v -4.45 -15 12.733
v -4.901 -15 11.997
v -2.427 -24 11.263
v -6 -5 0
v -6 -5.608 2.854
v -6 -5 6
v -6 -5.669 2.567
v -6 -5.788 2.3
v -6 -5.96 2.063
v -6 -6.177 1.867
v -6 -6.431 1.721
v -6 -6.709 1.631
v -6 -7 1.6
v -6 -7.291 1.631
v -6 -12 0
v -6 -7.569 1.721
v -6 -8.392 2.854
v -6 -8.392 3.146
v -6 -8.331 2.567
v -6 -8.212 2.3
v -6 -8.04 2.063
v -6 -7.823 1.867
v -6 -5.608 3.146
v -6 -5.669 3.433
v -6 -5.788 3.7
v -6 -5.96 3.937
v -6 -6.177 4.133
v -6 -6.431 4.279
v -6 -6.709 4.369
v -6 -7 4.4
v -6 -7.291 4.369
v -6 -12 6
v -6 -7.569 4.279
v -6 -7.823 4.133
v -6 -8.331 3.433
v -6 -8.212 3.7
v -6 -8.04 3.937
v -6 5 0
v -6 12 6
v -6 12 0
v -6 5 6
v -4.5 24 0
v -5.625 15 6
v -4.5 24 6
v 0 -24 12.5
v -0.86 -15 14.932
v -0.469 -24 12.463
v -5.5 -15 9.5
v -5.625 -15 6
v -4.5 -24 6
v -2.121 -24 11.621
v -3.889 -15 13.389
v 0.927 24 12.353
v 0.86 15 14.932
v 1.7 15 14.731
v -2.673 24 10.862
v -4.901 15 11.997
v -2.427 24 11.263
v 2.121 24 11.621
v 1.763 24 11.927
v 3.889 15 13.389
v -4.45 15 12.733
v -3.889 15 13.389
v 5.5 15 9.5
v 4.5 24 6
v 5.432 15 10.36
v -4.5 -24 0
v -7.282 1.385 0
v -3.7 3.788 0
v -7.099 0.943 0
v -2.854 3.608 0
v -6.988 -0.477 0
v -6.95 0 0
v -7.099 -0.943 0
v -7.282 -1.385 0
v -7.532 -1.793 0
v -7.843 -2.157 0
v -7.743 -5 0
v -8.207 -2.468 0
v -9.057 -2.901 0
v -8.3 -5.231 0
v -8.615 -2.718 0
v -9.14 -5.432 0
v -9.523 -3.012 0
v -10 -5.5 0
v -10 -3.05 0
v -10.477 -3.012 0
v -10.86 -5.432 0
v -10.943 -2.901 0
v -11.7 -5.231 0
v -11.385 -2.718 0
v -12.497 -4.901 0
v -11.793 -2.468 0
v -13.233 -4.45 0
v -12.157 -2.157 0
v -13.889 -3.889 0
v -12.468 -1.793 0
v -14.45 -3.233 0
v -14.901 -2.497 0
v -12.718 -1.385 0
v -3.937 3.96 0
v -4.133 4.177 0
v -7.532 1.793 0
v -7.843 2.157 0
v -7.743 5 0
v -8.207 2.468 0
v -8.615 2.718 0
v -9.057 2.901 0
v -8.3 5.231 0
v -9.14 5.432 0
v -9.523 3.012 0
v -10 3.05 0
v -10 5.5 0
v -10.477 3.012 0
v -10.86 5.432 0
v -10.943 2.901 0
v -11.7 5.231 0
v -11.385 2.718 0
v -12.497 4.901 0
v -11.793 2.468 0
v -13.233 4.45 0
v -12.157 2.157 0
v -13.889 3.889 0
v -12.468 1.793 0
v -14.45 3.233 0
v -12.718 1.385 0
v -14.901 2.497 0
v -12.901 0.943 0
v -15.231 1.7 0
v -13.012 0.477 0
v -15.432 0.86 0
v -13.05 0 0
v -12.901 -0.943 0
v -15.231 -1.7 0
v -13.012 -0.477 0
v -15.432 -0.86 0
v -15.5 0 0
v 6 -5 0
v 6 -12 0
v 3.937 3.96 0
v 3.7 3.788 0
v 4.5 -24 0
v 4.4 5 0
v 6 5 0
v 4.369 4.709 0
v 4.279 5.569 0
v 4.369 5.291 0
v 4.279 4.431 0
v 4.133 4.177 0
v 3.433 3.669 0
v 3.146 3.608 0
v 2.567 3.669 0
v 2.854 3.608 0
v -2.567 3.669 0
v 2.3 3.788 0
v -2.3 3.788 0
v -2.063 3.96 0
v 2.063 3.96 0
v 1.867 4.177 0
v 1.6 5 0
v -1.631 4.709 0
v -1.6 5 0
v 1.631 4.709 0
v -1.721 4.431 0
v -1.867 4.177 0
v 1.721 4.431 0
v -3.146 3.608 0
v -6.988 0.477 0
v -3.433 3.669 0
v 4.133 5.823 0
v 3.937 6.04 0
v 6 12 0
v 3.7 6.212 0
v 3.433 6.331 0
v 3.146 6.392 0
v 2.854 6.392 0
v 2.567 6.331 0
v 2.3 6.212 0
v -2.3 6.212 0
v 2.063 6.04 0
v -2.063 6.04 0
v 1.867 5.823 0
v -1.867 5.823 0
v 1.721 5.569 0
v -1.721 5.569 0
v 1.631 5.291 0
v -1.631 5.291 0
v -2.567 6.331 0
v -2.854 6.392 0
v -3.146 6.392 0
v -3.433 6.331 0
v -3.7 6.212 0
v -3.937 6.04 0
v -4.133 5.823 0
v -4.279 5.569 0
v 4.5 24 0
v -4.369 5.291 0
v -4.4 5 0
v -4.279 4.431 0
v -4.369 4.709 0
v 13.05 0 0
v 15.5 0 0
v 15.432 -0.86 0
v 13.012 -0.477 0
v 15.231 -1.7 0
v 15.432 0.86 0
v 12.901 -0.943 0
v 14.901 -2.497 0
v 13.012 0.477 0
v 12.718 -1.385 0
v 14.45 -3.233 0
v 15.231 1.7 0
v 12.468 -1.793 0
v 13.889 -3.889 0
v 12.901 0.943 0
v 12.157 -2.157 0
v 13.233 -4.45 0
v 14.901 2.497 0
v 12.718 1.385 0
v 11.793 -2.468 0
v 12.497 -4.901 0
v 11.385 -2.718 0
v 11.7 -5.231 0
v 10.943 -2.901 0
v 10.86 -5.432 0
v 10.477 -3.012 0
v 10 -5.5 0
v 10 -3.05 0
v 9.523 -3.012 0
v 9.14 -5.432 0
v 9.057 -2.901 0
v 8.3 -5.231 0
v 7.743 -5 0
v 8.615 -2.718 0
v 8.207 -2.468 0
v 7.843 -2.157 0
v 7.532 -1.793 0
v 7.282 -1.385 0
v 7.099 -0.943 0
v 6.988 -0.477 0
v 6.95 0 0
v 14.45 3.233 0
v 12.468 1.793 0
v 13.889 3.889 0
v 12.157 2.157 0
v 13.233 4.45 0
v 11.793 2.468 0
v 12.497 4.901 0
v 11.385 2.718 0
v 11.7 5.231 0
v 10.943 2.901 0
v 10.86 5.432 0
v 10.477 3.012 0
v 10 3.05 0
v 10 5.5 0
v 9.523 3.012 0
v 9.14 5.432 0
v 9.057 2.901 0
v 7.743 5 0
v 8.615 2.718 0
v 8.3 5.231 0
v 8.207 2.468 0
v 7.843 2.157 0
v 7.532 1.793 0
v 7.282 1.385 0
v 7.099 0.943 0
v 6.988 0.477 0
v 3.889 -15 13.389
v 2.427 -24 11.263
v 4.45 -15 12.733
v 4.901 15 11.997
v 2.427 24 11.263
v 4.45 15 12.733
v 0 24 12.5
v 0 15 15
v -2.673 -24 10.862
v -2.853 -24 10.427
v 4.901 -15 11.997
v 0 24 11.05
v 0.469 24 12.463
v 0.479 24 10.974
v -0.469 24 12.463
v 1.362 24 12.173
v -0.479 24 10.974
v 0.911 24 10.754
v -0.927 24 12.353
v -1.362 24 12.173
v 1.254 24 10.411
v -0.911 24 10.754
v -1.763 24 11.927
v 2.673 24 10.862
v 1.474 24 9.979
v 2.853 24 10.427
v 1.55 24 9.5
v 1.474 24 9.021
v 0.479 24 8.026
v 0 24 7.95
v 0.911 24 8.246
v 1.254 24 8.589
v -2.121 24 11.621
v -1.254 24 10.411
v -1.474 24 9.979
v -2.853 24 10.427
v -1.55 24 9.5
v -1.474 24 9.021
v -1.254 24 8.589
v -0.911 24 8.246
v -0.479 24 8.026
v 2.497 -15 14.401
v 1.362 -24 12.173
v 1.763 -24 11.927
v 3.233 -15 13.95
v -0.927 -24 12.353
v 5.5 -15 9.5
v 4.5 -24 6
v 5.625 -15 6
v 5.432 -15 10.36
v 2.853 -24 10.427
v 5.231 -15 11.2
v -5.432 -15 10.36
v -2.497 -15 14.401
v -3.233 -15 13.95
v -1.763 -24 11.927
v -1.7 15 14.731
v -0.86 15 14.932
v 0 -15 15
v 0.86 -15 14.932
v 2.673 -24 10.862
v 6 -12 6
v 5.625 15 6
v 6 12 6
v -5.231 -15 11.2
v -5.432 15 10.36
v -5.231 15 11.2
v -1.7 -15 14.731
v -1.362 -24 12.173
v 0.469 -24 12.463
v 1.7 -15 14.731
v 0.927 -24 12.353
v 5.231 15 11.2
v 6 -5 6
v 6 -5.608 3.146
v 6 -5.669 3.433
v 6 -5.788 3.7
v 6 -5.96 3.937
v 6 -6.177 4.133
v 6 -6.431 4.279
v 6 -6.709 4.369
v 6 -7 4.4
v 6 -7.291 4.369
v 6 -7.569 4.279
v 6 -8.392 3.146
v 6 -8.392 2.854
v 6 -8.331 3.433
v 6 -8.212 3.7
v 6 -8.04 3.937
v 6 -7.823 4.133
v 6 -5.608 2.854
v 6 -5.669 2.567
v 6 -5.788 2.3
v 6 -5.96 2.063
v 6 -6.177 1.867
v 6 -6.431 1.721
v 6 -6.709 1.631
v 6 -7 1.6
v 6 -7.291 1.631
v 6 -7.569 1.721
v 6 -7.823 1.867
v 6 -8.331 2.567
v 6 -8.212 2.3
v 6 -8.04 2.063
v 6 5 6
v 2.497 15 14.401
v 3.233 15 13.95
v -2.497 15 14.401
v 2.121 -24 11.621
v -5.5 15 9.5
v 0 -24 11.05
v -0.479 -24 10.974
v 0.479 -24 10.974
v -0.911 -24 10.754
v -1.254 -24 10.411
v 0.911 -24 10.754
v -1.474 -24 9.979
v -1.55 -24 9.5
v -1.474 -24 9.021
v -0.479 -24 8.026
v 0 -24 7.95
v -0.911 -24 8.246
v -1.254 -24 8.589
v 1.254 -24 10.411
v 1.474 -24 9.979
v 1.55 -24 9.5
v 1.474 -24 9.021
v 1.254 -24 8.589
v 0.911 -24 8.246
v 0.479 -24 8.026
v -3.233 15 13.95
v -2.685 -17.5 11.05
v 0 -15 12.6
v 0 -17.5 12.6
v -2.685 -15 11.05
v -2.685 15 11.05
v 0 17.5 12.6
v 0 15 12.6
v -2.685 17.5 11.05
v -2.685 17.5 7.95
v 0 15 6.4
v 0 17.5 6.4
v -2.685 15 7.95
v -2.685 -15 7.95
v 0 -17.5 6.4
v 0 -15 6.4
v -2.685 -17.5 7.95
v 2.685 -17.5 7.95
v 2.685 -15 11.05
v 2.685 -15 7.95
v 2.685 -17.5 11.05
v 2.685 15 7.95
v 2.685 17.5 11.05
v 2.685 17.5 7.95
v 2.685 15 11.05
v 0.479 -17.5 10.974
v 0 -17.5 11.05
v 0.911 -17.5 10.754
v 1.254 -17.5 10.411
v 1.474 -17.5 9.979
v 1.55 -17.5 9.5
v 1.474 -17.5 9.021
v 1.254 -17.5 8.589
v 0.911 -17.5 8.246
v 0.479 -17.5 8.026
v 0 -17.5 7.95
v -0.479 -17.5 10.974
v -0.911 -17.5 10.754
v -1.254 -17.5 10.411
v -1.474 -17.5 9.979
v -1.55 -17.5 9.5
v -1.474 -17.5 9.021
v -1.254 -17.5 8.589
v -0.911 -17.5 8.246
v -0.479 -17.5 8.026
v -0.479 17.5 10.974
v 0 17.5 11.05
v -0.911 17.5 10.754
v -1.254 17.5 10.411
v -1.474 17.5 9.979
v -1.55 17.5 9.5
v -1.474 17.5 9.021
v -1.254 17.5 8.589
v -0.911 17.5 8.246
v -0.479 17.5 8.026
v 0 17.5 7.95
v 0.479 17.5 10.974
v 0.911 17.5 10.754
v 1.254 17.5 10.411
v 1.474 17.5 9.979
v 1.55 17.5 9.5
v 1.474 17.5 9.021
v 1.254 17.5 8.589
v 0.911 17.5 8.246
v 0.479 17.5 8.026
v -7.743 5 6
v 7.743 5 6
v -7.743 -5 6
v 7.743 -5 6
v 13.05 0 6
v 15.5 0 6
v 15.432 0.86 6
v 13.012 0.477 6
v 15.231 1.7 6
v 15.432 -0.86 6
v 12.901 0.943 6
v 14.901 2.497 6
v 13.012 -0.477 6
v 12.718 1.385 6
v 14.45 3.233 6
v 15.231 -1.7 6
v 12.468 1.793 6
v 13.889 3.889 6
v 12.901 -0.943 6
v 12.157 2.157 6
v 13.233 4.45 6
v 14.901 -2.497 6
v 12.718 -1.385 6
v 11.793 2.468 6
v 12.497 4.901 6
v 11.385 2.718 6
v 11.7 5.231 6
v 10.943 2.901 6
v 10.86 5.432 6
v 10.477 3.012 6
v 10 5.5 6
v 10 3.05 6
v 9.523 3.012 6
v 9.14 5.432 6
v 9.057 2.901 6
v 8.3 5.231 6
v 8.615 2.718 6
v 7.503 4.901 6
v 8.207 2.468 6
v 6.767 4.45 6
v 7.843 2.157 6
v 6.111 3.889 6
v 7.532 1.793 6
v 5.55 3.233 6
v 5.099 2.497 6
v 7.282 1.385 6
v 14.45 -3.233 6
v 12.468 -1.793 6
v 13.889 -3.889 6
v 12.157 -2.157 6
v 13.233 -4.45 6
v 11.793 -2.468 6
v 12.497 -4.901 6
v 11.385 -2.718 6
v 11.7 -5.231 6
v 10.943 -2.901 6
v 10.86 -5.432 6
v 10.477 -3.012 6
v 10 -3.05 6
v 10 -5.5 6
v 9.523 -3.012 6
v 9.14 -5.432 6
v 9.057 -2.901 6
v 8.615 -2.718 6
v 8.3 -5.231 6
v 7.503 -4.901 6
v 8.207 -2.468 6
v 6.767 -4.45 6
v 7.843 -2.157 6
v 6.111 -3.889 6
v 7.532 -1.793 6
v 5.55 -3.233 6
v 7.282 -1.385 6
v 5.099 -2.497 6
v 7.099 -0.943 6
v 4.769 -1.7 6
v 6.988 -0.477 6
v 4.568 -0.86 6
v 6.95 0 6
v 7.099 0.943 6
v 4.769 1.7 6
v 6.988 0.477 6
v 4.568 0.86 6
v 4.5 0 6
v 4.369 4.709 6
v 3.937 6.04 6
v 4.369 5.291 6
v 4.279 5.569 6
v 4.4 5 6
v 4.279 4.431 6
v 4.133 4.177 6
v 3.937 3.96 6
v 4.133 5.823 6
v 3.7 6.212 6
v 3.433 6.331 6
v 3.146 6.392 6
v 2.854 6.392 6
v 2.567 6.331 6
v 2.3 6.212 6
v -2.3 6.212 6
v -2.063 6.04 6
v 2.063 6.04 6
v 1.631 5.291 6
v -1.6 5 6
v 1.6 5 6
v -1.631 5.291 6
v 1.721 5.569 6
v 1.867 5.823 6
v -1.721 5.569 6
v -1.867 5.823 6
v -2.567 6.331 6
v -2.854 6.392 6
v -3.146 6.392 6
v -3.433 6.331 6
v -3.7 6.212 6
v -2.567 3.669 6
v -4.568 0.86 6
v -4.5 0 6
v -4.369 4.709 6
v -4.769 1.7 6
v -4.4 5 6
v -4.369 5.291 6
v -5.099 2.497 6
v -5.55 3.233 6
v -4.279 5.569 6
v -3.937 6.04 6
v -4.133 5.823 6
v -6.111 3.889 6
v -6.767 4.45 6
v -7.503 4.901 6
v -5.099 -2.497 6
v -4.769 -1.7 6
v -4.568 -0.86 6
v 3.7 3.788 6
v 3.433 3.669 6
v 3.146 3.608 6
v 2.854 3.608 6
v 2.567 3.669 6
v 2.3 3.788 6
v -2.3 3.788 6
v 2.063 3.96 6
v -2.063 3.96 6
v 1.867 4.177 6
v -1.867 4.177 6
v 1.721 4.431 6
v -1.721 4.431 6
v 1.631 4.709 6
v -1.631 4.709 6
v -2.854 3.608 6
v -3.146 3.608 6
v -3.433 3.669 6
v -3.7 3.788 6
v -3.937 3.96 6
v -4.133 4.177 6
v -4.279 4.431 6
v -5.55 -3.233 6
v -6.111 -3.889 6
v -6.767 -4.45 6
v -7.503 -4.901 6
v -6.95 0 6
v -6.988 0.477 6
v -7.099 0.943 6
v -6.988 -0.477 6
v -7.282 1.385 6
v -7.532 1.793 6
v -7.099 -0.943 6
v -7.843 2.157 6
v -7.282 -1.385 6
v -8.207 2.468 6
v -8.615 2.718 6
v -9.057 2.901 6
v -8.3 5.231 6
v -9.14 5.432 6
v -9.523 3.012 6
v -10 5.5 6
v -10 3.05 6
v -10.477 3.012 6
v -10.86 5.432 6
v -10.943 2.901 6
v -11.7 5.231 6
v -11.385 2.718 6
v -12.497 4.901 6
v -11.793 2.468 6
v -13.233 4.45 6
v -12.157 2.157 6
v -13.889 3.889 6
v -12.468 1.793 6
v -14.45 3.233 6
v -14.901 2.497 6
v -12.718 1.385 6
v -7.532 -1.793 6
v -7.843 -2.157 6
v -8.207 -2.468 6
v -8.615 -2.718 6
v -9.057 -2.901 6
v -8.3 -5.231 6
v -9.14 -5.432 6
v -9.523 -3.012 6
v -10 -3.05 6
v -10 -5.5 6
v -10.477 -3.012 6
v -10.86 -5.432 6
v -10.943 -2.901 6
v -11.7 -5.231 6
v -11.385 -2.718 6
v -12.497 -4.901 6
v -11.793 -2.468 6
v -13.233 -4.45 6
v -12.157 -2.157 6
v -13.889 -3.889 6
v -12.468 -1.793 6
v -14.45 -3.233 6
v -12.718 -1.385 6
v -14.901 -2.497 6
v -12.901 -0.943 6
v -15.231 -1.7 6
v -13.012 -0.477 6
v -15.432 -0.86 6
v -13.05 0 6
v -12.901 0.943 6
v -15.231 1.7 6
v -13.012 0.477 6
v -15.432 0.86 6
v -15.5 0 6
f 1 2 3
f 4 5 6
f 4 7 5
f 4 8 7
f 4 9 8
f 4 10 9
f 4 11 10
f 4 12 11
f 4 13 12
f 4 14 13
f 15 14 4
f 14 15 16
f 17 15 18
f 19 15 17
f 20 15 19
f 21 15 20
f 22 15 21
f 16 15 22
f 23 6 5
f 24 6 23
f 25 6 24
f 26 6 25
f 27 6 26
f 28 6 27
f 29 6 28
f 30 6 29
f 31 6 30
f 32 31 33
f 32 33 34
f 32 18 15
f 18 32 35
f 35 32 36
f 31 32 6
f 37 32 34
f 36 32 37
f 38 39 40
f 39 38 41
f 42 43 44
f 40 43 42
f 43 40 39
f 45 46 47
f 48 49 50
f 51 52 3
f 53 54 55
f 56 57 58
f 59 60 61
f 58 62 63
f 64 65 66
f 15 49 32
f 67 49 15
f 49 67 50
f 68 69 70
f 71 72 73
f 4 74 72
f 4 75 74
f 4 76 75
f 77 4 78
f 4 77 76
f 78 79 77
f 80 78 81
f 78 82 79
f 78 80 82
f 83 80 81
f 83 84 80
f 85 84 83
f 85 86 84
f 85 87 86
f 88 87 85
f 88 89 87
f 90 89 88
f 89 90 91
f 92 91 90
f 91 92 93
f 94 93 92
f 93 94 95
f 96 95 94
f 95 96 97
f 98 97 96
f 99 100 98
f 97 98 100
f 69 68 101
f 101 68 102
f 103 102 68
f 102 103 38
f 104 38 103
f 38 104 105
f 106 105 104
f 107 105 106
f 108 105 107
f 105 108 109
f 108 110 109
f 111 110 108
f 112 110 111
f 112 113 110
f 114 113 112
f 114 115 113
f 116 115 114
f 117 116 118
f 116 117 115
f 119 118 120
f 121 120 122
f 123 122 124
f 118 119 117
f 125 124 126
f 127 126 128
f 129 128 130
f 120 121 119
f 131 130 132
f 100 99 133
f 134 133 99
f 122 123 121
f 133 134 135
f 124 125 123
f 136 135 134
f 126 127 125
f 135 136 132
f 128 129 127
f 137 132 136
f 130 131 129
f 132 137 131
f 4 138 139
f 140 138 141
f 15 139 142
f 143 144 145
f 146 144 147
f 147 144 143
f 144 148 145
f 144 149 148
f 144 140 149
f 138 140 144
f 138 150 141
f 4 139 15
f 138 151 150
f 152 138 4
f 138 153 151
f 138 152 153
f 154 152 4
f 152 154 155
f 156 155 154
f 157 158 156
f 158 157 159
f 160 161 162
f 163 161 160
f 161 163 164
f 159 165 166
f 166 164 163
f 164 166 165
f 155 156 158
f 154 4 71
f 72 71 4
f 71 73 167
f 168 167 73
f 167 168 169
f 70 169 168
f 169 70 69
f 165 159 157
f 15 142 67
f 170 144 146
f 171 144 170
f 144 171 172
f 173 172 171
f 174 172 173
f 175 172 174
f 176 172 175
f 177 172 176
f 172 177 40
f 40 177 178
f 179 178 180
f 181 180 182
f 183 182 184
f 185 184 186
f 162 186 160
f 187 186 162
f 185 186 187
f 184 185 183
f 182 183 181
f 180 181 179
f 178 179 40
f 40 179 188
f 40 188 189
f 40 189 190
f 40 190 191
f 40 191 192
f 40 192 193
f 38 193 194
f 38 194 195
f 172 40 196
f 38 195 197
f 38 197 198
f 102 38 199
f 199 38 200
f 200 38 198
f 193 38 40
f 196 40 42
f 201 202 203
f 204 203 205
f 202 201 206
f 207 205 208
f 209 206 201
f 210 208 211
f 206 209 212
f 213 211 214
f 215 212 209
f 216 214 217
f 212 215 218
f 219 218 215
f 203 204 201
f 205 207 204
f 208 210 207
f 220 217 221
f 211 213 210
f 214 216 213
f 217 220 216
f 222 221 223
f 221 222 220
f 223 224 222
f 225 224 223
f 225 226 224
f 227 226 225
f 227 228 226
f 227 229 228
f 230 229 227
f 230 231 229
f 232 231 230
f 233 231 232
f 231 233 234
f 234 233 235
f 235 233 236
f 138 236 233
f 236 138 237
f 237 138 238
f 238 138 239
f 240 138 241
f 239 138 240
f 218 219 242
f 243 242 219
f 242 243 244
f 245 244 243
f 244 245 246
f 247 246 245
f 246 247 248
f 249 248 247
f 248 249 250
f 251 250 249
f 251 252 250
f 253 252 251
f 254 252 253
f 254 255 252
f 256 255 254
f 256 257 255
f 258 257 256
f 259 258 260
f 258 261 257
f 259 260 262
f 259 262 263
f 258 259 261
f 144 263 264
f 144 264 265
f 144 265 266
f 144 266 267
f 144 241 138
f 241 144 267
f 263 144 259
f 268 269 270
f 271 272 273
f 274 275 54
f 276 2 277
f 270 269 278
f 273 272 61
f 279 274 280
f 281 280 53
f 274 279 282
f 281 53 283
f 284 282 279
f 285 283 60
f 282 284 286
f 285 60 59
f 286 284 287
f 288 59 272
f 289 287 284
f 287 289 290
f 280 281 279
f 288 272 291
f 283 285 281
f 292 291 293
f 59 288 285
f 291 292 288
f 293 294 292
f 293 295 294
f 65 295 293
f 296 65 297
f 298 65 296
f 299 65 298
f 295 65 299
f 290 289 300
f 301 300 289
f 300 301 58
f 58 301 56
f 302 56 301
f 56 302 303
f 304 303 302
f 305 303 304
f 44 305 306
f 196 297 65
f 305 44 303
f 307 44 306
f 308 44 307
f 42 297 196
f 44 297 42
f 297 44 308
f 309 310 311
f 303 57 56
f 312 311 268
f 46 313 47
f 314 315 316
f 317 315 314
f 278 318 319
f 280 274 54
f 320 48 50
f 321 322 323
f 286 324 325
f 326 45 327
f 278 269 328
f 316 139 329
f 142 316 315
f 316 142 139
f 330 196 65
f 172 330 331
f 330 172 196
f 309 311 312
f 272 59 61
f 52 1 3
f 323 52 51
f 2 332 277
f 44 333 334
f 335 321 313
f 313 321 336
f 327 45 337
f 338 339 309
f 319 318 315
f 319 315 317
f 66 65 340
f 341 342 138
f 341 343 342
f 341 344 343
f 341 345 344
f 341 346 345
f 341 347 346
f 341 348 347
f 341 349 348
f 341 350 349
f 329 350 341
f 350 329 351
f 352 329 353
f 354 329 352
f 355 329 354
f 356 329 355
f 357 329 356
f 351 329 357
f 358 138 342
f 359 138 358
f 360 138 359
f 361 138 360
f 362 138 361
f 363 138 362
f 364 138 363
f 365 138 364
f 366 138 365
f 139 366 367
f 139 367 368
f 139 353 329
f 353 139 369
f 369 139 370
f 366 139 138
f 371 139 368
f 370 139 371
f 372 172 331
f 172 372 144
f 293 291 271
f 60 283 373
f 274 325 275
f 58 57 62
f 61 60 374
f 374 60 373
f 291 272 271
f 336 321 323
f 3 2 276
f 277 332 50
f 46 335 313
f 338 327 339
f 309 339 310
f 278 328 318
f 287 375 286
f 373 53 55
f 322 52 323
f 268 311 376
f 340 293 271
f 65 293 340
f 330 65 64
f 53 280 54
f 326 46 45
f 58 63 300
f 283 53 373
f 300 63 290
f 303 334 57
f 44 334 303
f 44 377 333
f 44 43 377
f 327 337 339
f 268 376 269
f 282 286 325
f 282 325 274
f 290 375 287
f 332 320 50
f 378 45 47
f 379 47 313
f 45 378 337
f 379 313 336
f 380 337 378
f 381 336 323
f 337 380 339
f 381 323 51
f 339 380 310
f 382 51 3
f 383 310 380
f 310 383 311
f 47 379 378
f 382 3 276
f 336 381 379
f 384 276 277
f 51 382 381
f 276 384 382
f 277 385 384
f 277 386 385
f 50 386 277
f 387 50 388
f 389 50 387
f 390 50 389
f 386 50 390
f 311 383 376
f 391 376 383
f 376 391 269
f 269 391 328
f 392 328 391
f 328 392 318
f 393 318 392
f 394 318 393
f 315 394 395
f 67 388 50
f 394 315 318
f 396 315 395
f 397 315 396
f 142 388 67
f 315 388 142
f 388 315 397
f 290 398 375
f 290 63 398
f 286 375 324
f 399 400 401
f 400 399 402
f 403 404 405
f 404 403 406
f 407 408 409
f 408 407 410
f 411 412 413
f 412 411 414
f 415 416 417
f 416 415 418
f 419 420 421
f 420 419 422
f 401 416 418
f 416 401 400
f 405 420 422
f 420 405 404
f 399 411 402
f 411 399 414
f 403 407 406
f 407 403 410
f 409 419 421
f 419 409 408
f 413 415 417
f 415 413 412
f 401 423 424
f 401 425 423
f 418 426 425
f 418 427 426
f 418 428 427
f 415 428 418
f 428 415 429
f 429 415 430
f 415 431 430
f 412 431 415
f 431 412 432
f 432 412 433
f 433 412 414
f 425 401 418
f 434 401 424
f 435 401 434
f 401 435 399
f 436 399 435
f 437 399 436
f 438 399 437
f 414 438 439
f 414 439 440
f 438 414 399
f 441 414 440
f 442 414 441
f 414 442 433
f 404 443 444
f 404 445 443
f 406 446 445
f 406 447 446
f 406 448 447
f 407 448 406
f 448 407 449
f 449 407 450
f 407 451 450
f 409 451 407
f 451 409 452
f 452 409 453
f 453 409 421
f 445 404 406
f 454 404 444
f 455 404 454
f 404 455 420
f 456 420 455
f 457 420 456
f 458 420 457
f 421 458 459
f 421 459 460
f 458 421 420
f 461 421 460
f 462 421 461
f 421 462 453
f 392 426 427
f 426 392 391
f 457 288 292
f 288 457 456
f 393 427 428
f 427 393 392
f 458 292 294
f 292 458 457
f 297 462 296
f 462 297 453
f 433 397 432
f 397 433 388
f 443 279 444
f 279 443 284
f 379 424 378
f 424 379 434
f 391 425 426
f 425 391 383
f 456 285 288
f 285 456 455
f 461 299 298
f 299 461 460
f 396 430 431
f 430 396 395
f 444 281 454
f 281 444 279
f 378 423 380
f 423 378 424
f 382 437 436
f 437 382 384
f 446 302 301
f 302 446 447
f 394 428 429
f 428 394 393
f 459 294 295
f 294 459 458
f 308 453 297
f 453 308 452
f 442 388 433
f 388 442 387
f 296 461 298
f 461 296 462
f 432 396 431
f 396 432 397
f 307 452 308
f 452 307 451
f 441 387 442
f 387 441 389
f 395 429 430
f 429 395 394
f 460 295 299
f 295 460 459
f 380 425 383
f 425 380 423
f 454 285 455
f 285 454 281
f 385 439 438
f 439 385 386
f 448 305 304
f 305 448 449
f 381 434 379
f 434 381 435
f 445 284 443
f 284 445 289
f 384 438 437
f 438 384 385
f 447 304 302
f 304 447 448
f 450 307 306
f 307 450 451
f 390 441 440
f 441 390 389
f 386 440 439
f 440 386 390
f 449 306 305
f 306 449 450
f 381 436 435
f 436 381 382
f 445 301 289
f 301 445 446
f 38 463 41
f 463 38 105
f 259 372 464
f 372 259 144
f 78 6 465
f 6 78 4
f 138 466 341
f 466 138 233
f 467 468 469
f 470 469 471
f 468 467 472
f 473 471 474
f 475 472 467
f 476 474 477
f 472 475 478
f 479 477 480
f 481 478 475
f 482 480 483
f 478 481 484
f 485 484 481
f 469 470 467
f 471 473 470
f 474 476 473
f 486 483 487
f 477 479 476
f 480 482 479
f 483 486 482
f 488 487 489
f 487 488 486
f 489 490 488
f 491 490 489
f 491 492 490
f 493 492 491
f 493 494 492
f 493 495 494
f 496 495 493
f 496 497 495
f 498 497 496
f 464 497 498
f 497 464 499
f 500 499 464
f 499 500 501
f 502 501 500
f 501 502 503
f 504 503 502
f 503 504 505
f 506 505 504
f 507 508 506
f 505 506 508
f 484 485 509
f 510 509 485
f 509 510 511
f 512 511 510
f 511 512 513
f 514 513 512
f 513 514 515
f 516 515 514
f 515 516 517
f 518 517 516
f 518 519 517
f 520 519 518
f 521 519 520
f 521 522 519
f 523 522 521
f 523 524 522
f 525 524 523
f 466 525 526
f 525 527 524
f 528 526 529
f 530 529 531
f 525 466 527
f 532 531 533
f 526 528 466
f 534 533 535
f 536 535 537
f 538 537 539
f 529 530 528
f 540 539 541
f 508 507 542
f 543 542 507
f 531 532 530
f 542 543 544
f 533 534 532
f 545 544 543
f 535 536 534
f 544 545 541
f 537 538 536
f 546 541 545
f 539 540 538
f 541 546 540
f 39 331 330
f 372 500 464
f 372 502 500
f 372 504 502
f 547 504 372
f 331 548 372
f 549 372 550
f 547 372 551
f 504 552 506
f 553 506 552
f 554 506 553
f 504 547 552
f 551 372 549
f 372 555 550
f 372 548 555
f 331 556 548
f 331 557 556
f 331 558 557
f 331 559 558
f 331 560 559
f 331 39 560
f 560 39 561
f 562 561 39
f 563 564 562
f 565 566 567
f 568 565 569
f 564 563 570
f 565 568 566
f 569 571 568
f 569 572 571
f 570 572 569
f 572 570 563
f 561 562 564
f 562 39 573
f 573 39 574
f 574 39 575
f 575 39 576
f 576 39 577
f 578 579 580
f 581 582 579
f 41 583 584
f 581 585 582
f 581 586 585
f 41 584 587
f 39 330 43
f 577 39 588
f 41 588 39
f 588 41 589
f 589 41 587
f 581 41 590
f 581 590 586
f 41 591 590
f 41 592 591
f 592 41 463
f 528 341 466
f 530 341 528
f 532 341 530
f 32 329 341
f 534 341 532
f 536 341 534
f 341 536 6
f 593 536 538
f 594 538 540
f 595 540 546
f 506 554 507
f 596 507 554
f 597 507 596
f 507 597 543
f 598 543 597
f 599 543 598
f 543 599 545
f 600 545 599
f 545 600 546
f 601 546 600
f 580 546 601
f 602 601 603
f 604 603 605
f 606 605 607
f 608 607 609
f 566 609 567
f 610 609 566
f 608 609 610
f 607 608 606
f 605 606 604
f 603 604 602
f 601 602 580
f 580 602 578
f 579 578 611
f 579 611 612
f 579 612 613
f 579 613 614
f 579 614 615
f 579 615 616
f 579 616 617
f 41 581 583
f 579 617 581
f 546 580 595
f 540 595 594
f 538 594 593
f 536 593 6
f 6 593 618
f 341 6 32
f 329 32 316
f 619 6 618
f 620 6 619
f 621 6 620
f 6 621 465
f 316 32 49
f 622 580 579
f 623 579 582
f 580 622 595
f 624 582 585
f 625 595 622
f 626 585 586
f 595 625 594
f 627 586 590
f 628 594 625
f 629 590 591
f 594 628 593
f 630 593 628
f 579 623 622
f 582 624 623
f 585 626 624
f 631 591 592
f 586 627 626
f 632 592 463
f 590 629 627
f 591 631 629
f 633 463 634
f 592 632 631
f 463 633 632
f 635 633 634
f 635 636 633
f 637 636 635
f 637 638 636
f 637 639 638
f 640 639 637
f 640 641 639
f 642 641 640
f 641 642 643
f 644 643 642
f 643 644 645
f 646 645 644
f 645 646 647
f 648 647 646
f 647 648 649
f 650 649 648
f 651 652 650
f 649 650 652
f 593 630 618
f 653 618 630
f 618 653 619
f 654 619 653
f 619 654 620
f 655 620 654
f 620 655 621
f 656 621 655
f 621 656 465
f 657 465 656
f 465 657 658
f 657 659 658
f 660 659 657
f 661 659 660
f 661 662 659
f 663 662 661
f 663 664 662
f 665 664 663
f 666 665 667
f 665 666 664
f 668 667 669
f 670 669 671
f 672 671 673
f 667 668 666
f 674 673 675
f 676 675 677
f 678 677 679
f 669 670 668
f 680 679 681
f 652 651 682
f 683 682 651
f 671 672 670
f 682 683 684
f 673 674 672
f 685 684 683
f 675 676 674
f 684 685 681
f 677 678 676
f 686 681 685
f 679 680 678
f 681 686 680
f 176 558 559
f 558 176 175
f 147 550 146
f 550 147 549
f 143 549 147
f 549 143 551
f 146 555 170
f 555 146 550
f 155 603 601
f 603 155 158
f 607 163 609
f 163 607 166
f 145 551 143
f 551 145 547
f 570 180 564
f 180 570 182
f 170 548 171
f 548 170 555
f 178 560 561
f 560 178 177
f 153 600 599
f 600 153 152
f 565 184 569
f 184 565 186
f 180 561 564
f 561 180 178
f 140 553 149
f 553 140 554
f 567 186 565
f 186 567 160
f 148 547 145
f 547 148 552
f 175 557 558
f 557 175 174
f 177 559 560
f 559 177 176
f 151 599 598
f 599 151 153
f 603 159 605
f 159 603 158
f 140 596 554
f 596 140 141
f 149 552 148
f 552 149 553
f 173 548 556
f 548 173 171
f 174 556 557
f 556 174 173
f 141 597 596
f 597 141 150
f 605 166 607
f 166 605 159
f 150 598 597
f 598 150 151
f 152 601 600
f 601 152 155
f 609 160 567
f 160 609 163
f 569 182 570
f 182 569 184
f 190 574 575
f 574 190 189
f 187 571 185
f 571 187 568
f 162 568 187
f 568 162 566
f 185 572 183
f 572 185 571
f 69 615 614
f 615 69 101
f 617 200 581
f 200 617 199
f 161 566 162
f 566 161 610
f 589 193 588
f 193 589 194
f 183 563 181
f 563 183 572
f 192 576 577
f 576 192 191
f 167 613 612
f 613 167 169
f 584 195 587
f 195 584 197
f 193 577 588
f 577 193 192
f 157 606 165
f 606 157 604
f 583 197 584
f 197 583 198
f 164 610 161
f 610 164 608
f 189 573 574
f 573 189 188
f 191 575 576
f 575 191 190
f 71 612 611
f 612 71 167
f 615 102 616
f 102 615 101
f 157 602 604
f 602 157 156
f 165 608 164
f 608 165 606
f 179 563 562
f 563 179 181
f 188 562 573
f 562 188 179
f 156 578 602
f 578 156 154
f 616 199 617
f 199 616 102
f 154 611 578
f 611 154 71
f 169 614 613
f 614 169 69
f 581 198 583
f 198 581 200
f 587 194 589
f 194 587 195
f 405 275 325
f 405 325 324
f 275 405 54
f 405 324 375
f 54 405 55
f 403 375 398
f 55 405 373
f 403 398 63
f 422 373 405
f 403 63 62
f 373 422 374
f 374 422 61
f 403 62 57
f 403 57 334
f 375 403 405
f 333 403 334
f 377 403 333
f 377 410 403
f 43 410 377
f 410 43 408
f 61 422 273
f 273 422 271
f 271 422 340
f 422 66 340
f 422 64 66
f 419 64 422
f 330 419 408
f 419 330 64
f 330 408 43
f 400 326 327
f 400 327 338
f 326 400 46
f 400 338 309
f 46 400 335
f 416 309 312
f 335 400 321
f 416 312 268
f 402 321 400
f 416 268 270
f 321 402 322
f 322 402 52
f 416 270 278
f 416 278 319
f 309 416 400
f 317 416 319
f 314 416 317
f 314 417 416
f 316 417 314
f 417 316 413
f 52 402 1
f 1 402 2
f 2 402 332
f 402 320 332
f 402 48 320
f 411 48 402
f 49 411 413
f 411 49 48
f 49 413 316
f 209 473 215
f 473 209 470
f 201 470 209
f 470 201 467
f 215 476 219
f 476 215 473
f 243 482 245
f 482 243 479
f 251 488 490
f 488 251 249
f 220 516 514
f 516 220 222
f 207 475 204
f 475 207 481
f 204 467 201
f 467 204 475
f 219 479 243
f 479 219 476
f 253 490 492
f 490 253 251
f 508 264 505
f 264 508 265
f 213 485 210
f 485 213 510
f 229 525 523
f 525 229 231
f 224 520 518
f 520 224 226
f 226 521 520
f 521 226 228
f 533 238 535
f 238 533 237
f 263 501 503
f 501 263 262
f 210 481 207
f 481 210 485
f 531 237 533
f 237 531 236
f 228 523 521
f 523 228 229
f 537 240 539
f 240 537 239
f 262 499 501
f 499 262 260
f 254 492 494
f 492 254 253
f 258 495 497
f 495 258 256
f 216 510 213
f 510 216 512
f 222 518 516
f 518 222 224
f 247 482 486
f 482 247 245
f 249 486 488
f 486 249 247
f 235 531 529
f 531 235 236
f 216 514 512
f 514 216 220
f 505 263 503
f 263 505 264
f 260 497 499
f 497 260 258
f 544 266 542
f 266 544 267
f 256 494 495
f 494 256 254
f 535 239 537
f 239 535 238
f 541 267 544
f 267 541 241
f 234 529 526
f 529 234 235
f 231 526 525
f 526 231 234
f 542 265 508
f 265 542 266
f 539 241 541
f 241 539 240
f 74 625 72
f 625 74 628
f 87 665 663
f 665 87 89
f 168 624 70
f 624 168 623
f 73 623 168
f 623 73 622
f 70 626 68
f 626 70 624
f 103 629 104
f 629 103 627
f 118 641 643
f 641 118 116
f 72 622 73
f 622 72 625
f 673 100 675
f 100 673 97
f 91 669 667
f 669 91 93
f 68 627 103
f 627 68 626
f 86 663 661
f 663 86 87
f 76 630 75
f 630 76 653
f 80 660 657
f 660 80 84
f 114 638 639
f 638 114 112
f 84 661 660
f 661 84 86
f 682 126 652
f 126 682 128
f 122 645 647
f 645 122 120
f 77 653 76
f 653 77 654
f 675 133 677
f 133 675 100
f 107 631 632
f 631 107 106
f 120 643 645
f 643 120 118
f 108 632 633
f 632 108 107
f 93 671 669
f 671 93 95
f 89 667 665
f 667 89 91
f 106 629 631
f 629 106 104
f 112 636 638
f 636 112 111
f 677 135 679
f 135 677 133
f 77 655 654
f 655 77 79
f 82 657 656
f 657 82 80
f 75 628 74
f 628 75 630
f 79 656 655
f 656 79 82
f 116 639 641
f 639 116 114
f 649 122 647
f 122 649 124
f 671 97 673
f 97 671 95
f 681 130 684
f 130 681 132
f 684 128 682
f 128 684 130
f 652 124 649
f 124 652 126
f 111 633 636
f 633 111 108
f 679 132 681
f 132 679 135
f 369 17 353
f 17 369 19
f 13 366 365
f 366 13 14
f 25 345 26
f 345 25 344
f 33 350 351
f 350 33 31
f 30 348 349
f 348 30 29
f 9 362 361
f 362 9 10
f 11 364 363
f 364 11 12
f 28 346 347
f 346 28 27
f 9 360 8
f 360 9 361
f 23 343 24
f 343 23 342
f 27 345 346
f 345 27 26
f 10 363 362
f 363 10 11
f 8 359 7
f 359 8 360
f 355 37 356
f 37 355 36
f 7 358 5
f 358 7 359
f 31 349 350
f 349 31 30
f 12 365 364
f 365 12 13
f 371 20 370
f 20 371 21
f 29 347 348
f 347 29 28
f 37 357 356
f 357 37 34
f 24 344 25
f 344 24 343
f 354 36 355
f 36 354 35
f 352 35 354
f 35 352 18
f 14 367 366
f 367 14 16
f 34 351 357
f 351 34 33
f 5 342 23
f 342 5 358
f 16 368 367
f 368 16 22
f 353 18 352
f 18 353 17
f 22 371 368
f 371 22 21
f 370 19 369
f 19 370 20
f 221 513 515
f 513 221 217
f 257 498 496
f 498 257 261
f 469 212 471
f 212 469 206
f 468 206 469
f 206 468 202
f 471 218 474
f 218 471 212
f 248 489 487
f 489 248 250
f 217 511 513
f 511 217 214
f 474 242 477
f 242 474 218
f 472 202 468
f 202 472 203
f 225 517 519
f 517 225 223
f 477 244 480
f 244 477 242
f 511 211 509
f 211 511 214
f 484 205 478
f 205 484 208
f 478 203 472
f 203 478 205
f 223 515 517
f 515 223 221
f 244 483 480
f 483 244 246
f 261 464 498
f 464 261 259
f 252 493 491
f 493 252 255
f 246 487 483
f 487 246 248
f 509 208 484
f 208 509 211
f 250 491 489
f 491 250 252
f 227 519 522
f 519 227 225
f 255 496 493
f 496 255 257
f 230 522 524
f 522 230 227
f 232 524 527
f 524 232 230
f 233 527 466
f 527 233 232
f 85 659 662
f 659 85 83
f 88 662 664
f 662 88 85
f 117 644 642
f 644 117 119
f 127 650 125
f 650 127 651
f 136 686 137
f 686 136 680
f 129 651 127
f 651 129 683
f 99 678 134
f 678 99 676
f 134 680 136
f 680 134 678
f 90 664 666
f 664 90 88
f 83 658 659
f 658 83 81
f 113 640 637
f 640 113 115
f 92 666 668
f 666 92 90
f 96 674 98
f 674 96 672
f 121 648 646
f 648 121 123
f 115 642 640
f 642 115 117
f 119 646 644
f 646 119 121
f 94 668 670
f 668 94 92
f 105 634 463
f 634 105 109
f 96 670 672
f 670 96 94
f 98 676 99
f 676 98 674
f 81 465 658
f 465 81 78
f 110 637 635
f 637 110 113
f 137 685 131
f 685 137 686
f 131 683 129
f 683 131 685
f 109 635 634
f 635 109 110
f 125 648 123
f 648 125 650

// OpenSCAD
plate_height = 6;

module igus_slide(){
	color("Silver") difference(){
		union(){
			translate([-200,-13.5,-6]) cube([400,27,6]);
			translate([-200,-9.5,-9]) cube([400,19,3]);
			translate([-200,-11,-9]) cube([400,22,1.5]);
		}
		translate([-210,-8.5,-4]) cube([420,17,5]);
		translate([-210,-12,-4.5]) cube([420,24,3.5]);
	}
}

module igus_slider(){
	translate([0,0,-4.5]){
		color("Khaki") translate([-17.5,-12,0]) cube([35,24,3.5]);
		color("DarkGray"){
			translate([-15,-7,2]) cube([30,14,3]);
			difference(){
				union(){
					translate([10,0,4]) cylinder(h=6,r=6/2,$fn=40);
					translate([-10,0,4]) cylinder(h=6,r=6/2,$fn=40);
				}
				translate([10,0,-1]) cylinder(h=20,r=4/2,$fn=40);
				translate([-10,0,-1]) cylinder(h=20,r=4/2,$fn=40);
			}
		}
	}
}


module belt(){
	color("black") translate([-200,11,8]) cube([400,1,5]);
	color("black") translate([-200,-12,8]) cube([400,1,5]);
}

module carriage(){
	difference(){
		union(){
			difference(){
				hull(){
					translate([-6,-12,0])cube([12,24,plate_height]);
					translate([-4.5,-4.5-19.5,0]) cube([9,8,plate_height]);
					translate([-4.5,16,0]) cube([9,8,plate_height]);
					translate([0,24,plate_height+3.5]) rotate([90,0,0])cylinder(9,3,5.5,$fn=40);
					translate([0,-24,plate_height+3.5]) rotate([-90,0,0])cylinder(9,3,5.5,$fn=40);
				}
				translate([0,0,plate_height+3.5]) rotate([90,30,0]) cylinder(h=35,r=6.2/2,$fn=6,center=true);
				translate([0,0,plate_height+3.5]) rotate([90,0,0])cylinder(h=60,r=3.1/2,$fn=20,center=true);
			}
			hull(){
				translate([10,0,0]) cylinder(h=6,r=10/2,$fn=40);
				translate([-10,0,0]) cylinder(h=6,r=10/2,$fn=40);
			}
		}
		translate([3,5,-1]) cylinder(h=20,r=2.8/2,$fn=30);
		translate([-3,5,-1]) cylinder(h=20,r=2.8/2,$fn=30);
		translate([0,-75,plate_height/2])rotate([0,-90,0])cylinder(h=20,r=2.9/2,$fn=30);

		translate([-25,-15,plate_height])cube([50,30,20]);

		translate([10,0,-1]) cylinder(h=10,r=6.1/2,$fn=40);
		translate([-10,0,-1]) cylinder(h=10,r=6.1/2,$fn=40);
		translate([15,-7,plate_height/2])rotate([0,-90,0])cylinder(h=30,r=2.8/2,$fn=30);
	}
	difference(){
		union(){
			translate([10,0,0]) cylinder(h=6,r=11/2,$fn=40);
			translate([-10,0,0]) cylinder(h=6,r=11/2,$fn=40);
		}
		translate([10,0,-1]) cylinder(h=10,r=6.1/2,$fn=40);
		translate([-10,0,-1]) cylinder(h=10,r=6.1/2,$fn=40);
		translate([-150,-7,plate_height/2])rotate([0,-90,0])cylinder(h=30,r=2.8/2,$fn=30);
	}
}

module assembly(){
	color("GreenYellow")  carriage();
	translate([0,0,-0.5]){
		igus_slide();
		igus_slider();
	}
	belt();
}

//assembly();
carriage();
